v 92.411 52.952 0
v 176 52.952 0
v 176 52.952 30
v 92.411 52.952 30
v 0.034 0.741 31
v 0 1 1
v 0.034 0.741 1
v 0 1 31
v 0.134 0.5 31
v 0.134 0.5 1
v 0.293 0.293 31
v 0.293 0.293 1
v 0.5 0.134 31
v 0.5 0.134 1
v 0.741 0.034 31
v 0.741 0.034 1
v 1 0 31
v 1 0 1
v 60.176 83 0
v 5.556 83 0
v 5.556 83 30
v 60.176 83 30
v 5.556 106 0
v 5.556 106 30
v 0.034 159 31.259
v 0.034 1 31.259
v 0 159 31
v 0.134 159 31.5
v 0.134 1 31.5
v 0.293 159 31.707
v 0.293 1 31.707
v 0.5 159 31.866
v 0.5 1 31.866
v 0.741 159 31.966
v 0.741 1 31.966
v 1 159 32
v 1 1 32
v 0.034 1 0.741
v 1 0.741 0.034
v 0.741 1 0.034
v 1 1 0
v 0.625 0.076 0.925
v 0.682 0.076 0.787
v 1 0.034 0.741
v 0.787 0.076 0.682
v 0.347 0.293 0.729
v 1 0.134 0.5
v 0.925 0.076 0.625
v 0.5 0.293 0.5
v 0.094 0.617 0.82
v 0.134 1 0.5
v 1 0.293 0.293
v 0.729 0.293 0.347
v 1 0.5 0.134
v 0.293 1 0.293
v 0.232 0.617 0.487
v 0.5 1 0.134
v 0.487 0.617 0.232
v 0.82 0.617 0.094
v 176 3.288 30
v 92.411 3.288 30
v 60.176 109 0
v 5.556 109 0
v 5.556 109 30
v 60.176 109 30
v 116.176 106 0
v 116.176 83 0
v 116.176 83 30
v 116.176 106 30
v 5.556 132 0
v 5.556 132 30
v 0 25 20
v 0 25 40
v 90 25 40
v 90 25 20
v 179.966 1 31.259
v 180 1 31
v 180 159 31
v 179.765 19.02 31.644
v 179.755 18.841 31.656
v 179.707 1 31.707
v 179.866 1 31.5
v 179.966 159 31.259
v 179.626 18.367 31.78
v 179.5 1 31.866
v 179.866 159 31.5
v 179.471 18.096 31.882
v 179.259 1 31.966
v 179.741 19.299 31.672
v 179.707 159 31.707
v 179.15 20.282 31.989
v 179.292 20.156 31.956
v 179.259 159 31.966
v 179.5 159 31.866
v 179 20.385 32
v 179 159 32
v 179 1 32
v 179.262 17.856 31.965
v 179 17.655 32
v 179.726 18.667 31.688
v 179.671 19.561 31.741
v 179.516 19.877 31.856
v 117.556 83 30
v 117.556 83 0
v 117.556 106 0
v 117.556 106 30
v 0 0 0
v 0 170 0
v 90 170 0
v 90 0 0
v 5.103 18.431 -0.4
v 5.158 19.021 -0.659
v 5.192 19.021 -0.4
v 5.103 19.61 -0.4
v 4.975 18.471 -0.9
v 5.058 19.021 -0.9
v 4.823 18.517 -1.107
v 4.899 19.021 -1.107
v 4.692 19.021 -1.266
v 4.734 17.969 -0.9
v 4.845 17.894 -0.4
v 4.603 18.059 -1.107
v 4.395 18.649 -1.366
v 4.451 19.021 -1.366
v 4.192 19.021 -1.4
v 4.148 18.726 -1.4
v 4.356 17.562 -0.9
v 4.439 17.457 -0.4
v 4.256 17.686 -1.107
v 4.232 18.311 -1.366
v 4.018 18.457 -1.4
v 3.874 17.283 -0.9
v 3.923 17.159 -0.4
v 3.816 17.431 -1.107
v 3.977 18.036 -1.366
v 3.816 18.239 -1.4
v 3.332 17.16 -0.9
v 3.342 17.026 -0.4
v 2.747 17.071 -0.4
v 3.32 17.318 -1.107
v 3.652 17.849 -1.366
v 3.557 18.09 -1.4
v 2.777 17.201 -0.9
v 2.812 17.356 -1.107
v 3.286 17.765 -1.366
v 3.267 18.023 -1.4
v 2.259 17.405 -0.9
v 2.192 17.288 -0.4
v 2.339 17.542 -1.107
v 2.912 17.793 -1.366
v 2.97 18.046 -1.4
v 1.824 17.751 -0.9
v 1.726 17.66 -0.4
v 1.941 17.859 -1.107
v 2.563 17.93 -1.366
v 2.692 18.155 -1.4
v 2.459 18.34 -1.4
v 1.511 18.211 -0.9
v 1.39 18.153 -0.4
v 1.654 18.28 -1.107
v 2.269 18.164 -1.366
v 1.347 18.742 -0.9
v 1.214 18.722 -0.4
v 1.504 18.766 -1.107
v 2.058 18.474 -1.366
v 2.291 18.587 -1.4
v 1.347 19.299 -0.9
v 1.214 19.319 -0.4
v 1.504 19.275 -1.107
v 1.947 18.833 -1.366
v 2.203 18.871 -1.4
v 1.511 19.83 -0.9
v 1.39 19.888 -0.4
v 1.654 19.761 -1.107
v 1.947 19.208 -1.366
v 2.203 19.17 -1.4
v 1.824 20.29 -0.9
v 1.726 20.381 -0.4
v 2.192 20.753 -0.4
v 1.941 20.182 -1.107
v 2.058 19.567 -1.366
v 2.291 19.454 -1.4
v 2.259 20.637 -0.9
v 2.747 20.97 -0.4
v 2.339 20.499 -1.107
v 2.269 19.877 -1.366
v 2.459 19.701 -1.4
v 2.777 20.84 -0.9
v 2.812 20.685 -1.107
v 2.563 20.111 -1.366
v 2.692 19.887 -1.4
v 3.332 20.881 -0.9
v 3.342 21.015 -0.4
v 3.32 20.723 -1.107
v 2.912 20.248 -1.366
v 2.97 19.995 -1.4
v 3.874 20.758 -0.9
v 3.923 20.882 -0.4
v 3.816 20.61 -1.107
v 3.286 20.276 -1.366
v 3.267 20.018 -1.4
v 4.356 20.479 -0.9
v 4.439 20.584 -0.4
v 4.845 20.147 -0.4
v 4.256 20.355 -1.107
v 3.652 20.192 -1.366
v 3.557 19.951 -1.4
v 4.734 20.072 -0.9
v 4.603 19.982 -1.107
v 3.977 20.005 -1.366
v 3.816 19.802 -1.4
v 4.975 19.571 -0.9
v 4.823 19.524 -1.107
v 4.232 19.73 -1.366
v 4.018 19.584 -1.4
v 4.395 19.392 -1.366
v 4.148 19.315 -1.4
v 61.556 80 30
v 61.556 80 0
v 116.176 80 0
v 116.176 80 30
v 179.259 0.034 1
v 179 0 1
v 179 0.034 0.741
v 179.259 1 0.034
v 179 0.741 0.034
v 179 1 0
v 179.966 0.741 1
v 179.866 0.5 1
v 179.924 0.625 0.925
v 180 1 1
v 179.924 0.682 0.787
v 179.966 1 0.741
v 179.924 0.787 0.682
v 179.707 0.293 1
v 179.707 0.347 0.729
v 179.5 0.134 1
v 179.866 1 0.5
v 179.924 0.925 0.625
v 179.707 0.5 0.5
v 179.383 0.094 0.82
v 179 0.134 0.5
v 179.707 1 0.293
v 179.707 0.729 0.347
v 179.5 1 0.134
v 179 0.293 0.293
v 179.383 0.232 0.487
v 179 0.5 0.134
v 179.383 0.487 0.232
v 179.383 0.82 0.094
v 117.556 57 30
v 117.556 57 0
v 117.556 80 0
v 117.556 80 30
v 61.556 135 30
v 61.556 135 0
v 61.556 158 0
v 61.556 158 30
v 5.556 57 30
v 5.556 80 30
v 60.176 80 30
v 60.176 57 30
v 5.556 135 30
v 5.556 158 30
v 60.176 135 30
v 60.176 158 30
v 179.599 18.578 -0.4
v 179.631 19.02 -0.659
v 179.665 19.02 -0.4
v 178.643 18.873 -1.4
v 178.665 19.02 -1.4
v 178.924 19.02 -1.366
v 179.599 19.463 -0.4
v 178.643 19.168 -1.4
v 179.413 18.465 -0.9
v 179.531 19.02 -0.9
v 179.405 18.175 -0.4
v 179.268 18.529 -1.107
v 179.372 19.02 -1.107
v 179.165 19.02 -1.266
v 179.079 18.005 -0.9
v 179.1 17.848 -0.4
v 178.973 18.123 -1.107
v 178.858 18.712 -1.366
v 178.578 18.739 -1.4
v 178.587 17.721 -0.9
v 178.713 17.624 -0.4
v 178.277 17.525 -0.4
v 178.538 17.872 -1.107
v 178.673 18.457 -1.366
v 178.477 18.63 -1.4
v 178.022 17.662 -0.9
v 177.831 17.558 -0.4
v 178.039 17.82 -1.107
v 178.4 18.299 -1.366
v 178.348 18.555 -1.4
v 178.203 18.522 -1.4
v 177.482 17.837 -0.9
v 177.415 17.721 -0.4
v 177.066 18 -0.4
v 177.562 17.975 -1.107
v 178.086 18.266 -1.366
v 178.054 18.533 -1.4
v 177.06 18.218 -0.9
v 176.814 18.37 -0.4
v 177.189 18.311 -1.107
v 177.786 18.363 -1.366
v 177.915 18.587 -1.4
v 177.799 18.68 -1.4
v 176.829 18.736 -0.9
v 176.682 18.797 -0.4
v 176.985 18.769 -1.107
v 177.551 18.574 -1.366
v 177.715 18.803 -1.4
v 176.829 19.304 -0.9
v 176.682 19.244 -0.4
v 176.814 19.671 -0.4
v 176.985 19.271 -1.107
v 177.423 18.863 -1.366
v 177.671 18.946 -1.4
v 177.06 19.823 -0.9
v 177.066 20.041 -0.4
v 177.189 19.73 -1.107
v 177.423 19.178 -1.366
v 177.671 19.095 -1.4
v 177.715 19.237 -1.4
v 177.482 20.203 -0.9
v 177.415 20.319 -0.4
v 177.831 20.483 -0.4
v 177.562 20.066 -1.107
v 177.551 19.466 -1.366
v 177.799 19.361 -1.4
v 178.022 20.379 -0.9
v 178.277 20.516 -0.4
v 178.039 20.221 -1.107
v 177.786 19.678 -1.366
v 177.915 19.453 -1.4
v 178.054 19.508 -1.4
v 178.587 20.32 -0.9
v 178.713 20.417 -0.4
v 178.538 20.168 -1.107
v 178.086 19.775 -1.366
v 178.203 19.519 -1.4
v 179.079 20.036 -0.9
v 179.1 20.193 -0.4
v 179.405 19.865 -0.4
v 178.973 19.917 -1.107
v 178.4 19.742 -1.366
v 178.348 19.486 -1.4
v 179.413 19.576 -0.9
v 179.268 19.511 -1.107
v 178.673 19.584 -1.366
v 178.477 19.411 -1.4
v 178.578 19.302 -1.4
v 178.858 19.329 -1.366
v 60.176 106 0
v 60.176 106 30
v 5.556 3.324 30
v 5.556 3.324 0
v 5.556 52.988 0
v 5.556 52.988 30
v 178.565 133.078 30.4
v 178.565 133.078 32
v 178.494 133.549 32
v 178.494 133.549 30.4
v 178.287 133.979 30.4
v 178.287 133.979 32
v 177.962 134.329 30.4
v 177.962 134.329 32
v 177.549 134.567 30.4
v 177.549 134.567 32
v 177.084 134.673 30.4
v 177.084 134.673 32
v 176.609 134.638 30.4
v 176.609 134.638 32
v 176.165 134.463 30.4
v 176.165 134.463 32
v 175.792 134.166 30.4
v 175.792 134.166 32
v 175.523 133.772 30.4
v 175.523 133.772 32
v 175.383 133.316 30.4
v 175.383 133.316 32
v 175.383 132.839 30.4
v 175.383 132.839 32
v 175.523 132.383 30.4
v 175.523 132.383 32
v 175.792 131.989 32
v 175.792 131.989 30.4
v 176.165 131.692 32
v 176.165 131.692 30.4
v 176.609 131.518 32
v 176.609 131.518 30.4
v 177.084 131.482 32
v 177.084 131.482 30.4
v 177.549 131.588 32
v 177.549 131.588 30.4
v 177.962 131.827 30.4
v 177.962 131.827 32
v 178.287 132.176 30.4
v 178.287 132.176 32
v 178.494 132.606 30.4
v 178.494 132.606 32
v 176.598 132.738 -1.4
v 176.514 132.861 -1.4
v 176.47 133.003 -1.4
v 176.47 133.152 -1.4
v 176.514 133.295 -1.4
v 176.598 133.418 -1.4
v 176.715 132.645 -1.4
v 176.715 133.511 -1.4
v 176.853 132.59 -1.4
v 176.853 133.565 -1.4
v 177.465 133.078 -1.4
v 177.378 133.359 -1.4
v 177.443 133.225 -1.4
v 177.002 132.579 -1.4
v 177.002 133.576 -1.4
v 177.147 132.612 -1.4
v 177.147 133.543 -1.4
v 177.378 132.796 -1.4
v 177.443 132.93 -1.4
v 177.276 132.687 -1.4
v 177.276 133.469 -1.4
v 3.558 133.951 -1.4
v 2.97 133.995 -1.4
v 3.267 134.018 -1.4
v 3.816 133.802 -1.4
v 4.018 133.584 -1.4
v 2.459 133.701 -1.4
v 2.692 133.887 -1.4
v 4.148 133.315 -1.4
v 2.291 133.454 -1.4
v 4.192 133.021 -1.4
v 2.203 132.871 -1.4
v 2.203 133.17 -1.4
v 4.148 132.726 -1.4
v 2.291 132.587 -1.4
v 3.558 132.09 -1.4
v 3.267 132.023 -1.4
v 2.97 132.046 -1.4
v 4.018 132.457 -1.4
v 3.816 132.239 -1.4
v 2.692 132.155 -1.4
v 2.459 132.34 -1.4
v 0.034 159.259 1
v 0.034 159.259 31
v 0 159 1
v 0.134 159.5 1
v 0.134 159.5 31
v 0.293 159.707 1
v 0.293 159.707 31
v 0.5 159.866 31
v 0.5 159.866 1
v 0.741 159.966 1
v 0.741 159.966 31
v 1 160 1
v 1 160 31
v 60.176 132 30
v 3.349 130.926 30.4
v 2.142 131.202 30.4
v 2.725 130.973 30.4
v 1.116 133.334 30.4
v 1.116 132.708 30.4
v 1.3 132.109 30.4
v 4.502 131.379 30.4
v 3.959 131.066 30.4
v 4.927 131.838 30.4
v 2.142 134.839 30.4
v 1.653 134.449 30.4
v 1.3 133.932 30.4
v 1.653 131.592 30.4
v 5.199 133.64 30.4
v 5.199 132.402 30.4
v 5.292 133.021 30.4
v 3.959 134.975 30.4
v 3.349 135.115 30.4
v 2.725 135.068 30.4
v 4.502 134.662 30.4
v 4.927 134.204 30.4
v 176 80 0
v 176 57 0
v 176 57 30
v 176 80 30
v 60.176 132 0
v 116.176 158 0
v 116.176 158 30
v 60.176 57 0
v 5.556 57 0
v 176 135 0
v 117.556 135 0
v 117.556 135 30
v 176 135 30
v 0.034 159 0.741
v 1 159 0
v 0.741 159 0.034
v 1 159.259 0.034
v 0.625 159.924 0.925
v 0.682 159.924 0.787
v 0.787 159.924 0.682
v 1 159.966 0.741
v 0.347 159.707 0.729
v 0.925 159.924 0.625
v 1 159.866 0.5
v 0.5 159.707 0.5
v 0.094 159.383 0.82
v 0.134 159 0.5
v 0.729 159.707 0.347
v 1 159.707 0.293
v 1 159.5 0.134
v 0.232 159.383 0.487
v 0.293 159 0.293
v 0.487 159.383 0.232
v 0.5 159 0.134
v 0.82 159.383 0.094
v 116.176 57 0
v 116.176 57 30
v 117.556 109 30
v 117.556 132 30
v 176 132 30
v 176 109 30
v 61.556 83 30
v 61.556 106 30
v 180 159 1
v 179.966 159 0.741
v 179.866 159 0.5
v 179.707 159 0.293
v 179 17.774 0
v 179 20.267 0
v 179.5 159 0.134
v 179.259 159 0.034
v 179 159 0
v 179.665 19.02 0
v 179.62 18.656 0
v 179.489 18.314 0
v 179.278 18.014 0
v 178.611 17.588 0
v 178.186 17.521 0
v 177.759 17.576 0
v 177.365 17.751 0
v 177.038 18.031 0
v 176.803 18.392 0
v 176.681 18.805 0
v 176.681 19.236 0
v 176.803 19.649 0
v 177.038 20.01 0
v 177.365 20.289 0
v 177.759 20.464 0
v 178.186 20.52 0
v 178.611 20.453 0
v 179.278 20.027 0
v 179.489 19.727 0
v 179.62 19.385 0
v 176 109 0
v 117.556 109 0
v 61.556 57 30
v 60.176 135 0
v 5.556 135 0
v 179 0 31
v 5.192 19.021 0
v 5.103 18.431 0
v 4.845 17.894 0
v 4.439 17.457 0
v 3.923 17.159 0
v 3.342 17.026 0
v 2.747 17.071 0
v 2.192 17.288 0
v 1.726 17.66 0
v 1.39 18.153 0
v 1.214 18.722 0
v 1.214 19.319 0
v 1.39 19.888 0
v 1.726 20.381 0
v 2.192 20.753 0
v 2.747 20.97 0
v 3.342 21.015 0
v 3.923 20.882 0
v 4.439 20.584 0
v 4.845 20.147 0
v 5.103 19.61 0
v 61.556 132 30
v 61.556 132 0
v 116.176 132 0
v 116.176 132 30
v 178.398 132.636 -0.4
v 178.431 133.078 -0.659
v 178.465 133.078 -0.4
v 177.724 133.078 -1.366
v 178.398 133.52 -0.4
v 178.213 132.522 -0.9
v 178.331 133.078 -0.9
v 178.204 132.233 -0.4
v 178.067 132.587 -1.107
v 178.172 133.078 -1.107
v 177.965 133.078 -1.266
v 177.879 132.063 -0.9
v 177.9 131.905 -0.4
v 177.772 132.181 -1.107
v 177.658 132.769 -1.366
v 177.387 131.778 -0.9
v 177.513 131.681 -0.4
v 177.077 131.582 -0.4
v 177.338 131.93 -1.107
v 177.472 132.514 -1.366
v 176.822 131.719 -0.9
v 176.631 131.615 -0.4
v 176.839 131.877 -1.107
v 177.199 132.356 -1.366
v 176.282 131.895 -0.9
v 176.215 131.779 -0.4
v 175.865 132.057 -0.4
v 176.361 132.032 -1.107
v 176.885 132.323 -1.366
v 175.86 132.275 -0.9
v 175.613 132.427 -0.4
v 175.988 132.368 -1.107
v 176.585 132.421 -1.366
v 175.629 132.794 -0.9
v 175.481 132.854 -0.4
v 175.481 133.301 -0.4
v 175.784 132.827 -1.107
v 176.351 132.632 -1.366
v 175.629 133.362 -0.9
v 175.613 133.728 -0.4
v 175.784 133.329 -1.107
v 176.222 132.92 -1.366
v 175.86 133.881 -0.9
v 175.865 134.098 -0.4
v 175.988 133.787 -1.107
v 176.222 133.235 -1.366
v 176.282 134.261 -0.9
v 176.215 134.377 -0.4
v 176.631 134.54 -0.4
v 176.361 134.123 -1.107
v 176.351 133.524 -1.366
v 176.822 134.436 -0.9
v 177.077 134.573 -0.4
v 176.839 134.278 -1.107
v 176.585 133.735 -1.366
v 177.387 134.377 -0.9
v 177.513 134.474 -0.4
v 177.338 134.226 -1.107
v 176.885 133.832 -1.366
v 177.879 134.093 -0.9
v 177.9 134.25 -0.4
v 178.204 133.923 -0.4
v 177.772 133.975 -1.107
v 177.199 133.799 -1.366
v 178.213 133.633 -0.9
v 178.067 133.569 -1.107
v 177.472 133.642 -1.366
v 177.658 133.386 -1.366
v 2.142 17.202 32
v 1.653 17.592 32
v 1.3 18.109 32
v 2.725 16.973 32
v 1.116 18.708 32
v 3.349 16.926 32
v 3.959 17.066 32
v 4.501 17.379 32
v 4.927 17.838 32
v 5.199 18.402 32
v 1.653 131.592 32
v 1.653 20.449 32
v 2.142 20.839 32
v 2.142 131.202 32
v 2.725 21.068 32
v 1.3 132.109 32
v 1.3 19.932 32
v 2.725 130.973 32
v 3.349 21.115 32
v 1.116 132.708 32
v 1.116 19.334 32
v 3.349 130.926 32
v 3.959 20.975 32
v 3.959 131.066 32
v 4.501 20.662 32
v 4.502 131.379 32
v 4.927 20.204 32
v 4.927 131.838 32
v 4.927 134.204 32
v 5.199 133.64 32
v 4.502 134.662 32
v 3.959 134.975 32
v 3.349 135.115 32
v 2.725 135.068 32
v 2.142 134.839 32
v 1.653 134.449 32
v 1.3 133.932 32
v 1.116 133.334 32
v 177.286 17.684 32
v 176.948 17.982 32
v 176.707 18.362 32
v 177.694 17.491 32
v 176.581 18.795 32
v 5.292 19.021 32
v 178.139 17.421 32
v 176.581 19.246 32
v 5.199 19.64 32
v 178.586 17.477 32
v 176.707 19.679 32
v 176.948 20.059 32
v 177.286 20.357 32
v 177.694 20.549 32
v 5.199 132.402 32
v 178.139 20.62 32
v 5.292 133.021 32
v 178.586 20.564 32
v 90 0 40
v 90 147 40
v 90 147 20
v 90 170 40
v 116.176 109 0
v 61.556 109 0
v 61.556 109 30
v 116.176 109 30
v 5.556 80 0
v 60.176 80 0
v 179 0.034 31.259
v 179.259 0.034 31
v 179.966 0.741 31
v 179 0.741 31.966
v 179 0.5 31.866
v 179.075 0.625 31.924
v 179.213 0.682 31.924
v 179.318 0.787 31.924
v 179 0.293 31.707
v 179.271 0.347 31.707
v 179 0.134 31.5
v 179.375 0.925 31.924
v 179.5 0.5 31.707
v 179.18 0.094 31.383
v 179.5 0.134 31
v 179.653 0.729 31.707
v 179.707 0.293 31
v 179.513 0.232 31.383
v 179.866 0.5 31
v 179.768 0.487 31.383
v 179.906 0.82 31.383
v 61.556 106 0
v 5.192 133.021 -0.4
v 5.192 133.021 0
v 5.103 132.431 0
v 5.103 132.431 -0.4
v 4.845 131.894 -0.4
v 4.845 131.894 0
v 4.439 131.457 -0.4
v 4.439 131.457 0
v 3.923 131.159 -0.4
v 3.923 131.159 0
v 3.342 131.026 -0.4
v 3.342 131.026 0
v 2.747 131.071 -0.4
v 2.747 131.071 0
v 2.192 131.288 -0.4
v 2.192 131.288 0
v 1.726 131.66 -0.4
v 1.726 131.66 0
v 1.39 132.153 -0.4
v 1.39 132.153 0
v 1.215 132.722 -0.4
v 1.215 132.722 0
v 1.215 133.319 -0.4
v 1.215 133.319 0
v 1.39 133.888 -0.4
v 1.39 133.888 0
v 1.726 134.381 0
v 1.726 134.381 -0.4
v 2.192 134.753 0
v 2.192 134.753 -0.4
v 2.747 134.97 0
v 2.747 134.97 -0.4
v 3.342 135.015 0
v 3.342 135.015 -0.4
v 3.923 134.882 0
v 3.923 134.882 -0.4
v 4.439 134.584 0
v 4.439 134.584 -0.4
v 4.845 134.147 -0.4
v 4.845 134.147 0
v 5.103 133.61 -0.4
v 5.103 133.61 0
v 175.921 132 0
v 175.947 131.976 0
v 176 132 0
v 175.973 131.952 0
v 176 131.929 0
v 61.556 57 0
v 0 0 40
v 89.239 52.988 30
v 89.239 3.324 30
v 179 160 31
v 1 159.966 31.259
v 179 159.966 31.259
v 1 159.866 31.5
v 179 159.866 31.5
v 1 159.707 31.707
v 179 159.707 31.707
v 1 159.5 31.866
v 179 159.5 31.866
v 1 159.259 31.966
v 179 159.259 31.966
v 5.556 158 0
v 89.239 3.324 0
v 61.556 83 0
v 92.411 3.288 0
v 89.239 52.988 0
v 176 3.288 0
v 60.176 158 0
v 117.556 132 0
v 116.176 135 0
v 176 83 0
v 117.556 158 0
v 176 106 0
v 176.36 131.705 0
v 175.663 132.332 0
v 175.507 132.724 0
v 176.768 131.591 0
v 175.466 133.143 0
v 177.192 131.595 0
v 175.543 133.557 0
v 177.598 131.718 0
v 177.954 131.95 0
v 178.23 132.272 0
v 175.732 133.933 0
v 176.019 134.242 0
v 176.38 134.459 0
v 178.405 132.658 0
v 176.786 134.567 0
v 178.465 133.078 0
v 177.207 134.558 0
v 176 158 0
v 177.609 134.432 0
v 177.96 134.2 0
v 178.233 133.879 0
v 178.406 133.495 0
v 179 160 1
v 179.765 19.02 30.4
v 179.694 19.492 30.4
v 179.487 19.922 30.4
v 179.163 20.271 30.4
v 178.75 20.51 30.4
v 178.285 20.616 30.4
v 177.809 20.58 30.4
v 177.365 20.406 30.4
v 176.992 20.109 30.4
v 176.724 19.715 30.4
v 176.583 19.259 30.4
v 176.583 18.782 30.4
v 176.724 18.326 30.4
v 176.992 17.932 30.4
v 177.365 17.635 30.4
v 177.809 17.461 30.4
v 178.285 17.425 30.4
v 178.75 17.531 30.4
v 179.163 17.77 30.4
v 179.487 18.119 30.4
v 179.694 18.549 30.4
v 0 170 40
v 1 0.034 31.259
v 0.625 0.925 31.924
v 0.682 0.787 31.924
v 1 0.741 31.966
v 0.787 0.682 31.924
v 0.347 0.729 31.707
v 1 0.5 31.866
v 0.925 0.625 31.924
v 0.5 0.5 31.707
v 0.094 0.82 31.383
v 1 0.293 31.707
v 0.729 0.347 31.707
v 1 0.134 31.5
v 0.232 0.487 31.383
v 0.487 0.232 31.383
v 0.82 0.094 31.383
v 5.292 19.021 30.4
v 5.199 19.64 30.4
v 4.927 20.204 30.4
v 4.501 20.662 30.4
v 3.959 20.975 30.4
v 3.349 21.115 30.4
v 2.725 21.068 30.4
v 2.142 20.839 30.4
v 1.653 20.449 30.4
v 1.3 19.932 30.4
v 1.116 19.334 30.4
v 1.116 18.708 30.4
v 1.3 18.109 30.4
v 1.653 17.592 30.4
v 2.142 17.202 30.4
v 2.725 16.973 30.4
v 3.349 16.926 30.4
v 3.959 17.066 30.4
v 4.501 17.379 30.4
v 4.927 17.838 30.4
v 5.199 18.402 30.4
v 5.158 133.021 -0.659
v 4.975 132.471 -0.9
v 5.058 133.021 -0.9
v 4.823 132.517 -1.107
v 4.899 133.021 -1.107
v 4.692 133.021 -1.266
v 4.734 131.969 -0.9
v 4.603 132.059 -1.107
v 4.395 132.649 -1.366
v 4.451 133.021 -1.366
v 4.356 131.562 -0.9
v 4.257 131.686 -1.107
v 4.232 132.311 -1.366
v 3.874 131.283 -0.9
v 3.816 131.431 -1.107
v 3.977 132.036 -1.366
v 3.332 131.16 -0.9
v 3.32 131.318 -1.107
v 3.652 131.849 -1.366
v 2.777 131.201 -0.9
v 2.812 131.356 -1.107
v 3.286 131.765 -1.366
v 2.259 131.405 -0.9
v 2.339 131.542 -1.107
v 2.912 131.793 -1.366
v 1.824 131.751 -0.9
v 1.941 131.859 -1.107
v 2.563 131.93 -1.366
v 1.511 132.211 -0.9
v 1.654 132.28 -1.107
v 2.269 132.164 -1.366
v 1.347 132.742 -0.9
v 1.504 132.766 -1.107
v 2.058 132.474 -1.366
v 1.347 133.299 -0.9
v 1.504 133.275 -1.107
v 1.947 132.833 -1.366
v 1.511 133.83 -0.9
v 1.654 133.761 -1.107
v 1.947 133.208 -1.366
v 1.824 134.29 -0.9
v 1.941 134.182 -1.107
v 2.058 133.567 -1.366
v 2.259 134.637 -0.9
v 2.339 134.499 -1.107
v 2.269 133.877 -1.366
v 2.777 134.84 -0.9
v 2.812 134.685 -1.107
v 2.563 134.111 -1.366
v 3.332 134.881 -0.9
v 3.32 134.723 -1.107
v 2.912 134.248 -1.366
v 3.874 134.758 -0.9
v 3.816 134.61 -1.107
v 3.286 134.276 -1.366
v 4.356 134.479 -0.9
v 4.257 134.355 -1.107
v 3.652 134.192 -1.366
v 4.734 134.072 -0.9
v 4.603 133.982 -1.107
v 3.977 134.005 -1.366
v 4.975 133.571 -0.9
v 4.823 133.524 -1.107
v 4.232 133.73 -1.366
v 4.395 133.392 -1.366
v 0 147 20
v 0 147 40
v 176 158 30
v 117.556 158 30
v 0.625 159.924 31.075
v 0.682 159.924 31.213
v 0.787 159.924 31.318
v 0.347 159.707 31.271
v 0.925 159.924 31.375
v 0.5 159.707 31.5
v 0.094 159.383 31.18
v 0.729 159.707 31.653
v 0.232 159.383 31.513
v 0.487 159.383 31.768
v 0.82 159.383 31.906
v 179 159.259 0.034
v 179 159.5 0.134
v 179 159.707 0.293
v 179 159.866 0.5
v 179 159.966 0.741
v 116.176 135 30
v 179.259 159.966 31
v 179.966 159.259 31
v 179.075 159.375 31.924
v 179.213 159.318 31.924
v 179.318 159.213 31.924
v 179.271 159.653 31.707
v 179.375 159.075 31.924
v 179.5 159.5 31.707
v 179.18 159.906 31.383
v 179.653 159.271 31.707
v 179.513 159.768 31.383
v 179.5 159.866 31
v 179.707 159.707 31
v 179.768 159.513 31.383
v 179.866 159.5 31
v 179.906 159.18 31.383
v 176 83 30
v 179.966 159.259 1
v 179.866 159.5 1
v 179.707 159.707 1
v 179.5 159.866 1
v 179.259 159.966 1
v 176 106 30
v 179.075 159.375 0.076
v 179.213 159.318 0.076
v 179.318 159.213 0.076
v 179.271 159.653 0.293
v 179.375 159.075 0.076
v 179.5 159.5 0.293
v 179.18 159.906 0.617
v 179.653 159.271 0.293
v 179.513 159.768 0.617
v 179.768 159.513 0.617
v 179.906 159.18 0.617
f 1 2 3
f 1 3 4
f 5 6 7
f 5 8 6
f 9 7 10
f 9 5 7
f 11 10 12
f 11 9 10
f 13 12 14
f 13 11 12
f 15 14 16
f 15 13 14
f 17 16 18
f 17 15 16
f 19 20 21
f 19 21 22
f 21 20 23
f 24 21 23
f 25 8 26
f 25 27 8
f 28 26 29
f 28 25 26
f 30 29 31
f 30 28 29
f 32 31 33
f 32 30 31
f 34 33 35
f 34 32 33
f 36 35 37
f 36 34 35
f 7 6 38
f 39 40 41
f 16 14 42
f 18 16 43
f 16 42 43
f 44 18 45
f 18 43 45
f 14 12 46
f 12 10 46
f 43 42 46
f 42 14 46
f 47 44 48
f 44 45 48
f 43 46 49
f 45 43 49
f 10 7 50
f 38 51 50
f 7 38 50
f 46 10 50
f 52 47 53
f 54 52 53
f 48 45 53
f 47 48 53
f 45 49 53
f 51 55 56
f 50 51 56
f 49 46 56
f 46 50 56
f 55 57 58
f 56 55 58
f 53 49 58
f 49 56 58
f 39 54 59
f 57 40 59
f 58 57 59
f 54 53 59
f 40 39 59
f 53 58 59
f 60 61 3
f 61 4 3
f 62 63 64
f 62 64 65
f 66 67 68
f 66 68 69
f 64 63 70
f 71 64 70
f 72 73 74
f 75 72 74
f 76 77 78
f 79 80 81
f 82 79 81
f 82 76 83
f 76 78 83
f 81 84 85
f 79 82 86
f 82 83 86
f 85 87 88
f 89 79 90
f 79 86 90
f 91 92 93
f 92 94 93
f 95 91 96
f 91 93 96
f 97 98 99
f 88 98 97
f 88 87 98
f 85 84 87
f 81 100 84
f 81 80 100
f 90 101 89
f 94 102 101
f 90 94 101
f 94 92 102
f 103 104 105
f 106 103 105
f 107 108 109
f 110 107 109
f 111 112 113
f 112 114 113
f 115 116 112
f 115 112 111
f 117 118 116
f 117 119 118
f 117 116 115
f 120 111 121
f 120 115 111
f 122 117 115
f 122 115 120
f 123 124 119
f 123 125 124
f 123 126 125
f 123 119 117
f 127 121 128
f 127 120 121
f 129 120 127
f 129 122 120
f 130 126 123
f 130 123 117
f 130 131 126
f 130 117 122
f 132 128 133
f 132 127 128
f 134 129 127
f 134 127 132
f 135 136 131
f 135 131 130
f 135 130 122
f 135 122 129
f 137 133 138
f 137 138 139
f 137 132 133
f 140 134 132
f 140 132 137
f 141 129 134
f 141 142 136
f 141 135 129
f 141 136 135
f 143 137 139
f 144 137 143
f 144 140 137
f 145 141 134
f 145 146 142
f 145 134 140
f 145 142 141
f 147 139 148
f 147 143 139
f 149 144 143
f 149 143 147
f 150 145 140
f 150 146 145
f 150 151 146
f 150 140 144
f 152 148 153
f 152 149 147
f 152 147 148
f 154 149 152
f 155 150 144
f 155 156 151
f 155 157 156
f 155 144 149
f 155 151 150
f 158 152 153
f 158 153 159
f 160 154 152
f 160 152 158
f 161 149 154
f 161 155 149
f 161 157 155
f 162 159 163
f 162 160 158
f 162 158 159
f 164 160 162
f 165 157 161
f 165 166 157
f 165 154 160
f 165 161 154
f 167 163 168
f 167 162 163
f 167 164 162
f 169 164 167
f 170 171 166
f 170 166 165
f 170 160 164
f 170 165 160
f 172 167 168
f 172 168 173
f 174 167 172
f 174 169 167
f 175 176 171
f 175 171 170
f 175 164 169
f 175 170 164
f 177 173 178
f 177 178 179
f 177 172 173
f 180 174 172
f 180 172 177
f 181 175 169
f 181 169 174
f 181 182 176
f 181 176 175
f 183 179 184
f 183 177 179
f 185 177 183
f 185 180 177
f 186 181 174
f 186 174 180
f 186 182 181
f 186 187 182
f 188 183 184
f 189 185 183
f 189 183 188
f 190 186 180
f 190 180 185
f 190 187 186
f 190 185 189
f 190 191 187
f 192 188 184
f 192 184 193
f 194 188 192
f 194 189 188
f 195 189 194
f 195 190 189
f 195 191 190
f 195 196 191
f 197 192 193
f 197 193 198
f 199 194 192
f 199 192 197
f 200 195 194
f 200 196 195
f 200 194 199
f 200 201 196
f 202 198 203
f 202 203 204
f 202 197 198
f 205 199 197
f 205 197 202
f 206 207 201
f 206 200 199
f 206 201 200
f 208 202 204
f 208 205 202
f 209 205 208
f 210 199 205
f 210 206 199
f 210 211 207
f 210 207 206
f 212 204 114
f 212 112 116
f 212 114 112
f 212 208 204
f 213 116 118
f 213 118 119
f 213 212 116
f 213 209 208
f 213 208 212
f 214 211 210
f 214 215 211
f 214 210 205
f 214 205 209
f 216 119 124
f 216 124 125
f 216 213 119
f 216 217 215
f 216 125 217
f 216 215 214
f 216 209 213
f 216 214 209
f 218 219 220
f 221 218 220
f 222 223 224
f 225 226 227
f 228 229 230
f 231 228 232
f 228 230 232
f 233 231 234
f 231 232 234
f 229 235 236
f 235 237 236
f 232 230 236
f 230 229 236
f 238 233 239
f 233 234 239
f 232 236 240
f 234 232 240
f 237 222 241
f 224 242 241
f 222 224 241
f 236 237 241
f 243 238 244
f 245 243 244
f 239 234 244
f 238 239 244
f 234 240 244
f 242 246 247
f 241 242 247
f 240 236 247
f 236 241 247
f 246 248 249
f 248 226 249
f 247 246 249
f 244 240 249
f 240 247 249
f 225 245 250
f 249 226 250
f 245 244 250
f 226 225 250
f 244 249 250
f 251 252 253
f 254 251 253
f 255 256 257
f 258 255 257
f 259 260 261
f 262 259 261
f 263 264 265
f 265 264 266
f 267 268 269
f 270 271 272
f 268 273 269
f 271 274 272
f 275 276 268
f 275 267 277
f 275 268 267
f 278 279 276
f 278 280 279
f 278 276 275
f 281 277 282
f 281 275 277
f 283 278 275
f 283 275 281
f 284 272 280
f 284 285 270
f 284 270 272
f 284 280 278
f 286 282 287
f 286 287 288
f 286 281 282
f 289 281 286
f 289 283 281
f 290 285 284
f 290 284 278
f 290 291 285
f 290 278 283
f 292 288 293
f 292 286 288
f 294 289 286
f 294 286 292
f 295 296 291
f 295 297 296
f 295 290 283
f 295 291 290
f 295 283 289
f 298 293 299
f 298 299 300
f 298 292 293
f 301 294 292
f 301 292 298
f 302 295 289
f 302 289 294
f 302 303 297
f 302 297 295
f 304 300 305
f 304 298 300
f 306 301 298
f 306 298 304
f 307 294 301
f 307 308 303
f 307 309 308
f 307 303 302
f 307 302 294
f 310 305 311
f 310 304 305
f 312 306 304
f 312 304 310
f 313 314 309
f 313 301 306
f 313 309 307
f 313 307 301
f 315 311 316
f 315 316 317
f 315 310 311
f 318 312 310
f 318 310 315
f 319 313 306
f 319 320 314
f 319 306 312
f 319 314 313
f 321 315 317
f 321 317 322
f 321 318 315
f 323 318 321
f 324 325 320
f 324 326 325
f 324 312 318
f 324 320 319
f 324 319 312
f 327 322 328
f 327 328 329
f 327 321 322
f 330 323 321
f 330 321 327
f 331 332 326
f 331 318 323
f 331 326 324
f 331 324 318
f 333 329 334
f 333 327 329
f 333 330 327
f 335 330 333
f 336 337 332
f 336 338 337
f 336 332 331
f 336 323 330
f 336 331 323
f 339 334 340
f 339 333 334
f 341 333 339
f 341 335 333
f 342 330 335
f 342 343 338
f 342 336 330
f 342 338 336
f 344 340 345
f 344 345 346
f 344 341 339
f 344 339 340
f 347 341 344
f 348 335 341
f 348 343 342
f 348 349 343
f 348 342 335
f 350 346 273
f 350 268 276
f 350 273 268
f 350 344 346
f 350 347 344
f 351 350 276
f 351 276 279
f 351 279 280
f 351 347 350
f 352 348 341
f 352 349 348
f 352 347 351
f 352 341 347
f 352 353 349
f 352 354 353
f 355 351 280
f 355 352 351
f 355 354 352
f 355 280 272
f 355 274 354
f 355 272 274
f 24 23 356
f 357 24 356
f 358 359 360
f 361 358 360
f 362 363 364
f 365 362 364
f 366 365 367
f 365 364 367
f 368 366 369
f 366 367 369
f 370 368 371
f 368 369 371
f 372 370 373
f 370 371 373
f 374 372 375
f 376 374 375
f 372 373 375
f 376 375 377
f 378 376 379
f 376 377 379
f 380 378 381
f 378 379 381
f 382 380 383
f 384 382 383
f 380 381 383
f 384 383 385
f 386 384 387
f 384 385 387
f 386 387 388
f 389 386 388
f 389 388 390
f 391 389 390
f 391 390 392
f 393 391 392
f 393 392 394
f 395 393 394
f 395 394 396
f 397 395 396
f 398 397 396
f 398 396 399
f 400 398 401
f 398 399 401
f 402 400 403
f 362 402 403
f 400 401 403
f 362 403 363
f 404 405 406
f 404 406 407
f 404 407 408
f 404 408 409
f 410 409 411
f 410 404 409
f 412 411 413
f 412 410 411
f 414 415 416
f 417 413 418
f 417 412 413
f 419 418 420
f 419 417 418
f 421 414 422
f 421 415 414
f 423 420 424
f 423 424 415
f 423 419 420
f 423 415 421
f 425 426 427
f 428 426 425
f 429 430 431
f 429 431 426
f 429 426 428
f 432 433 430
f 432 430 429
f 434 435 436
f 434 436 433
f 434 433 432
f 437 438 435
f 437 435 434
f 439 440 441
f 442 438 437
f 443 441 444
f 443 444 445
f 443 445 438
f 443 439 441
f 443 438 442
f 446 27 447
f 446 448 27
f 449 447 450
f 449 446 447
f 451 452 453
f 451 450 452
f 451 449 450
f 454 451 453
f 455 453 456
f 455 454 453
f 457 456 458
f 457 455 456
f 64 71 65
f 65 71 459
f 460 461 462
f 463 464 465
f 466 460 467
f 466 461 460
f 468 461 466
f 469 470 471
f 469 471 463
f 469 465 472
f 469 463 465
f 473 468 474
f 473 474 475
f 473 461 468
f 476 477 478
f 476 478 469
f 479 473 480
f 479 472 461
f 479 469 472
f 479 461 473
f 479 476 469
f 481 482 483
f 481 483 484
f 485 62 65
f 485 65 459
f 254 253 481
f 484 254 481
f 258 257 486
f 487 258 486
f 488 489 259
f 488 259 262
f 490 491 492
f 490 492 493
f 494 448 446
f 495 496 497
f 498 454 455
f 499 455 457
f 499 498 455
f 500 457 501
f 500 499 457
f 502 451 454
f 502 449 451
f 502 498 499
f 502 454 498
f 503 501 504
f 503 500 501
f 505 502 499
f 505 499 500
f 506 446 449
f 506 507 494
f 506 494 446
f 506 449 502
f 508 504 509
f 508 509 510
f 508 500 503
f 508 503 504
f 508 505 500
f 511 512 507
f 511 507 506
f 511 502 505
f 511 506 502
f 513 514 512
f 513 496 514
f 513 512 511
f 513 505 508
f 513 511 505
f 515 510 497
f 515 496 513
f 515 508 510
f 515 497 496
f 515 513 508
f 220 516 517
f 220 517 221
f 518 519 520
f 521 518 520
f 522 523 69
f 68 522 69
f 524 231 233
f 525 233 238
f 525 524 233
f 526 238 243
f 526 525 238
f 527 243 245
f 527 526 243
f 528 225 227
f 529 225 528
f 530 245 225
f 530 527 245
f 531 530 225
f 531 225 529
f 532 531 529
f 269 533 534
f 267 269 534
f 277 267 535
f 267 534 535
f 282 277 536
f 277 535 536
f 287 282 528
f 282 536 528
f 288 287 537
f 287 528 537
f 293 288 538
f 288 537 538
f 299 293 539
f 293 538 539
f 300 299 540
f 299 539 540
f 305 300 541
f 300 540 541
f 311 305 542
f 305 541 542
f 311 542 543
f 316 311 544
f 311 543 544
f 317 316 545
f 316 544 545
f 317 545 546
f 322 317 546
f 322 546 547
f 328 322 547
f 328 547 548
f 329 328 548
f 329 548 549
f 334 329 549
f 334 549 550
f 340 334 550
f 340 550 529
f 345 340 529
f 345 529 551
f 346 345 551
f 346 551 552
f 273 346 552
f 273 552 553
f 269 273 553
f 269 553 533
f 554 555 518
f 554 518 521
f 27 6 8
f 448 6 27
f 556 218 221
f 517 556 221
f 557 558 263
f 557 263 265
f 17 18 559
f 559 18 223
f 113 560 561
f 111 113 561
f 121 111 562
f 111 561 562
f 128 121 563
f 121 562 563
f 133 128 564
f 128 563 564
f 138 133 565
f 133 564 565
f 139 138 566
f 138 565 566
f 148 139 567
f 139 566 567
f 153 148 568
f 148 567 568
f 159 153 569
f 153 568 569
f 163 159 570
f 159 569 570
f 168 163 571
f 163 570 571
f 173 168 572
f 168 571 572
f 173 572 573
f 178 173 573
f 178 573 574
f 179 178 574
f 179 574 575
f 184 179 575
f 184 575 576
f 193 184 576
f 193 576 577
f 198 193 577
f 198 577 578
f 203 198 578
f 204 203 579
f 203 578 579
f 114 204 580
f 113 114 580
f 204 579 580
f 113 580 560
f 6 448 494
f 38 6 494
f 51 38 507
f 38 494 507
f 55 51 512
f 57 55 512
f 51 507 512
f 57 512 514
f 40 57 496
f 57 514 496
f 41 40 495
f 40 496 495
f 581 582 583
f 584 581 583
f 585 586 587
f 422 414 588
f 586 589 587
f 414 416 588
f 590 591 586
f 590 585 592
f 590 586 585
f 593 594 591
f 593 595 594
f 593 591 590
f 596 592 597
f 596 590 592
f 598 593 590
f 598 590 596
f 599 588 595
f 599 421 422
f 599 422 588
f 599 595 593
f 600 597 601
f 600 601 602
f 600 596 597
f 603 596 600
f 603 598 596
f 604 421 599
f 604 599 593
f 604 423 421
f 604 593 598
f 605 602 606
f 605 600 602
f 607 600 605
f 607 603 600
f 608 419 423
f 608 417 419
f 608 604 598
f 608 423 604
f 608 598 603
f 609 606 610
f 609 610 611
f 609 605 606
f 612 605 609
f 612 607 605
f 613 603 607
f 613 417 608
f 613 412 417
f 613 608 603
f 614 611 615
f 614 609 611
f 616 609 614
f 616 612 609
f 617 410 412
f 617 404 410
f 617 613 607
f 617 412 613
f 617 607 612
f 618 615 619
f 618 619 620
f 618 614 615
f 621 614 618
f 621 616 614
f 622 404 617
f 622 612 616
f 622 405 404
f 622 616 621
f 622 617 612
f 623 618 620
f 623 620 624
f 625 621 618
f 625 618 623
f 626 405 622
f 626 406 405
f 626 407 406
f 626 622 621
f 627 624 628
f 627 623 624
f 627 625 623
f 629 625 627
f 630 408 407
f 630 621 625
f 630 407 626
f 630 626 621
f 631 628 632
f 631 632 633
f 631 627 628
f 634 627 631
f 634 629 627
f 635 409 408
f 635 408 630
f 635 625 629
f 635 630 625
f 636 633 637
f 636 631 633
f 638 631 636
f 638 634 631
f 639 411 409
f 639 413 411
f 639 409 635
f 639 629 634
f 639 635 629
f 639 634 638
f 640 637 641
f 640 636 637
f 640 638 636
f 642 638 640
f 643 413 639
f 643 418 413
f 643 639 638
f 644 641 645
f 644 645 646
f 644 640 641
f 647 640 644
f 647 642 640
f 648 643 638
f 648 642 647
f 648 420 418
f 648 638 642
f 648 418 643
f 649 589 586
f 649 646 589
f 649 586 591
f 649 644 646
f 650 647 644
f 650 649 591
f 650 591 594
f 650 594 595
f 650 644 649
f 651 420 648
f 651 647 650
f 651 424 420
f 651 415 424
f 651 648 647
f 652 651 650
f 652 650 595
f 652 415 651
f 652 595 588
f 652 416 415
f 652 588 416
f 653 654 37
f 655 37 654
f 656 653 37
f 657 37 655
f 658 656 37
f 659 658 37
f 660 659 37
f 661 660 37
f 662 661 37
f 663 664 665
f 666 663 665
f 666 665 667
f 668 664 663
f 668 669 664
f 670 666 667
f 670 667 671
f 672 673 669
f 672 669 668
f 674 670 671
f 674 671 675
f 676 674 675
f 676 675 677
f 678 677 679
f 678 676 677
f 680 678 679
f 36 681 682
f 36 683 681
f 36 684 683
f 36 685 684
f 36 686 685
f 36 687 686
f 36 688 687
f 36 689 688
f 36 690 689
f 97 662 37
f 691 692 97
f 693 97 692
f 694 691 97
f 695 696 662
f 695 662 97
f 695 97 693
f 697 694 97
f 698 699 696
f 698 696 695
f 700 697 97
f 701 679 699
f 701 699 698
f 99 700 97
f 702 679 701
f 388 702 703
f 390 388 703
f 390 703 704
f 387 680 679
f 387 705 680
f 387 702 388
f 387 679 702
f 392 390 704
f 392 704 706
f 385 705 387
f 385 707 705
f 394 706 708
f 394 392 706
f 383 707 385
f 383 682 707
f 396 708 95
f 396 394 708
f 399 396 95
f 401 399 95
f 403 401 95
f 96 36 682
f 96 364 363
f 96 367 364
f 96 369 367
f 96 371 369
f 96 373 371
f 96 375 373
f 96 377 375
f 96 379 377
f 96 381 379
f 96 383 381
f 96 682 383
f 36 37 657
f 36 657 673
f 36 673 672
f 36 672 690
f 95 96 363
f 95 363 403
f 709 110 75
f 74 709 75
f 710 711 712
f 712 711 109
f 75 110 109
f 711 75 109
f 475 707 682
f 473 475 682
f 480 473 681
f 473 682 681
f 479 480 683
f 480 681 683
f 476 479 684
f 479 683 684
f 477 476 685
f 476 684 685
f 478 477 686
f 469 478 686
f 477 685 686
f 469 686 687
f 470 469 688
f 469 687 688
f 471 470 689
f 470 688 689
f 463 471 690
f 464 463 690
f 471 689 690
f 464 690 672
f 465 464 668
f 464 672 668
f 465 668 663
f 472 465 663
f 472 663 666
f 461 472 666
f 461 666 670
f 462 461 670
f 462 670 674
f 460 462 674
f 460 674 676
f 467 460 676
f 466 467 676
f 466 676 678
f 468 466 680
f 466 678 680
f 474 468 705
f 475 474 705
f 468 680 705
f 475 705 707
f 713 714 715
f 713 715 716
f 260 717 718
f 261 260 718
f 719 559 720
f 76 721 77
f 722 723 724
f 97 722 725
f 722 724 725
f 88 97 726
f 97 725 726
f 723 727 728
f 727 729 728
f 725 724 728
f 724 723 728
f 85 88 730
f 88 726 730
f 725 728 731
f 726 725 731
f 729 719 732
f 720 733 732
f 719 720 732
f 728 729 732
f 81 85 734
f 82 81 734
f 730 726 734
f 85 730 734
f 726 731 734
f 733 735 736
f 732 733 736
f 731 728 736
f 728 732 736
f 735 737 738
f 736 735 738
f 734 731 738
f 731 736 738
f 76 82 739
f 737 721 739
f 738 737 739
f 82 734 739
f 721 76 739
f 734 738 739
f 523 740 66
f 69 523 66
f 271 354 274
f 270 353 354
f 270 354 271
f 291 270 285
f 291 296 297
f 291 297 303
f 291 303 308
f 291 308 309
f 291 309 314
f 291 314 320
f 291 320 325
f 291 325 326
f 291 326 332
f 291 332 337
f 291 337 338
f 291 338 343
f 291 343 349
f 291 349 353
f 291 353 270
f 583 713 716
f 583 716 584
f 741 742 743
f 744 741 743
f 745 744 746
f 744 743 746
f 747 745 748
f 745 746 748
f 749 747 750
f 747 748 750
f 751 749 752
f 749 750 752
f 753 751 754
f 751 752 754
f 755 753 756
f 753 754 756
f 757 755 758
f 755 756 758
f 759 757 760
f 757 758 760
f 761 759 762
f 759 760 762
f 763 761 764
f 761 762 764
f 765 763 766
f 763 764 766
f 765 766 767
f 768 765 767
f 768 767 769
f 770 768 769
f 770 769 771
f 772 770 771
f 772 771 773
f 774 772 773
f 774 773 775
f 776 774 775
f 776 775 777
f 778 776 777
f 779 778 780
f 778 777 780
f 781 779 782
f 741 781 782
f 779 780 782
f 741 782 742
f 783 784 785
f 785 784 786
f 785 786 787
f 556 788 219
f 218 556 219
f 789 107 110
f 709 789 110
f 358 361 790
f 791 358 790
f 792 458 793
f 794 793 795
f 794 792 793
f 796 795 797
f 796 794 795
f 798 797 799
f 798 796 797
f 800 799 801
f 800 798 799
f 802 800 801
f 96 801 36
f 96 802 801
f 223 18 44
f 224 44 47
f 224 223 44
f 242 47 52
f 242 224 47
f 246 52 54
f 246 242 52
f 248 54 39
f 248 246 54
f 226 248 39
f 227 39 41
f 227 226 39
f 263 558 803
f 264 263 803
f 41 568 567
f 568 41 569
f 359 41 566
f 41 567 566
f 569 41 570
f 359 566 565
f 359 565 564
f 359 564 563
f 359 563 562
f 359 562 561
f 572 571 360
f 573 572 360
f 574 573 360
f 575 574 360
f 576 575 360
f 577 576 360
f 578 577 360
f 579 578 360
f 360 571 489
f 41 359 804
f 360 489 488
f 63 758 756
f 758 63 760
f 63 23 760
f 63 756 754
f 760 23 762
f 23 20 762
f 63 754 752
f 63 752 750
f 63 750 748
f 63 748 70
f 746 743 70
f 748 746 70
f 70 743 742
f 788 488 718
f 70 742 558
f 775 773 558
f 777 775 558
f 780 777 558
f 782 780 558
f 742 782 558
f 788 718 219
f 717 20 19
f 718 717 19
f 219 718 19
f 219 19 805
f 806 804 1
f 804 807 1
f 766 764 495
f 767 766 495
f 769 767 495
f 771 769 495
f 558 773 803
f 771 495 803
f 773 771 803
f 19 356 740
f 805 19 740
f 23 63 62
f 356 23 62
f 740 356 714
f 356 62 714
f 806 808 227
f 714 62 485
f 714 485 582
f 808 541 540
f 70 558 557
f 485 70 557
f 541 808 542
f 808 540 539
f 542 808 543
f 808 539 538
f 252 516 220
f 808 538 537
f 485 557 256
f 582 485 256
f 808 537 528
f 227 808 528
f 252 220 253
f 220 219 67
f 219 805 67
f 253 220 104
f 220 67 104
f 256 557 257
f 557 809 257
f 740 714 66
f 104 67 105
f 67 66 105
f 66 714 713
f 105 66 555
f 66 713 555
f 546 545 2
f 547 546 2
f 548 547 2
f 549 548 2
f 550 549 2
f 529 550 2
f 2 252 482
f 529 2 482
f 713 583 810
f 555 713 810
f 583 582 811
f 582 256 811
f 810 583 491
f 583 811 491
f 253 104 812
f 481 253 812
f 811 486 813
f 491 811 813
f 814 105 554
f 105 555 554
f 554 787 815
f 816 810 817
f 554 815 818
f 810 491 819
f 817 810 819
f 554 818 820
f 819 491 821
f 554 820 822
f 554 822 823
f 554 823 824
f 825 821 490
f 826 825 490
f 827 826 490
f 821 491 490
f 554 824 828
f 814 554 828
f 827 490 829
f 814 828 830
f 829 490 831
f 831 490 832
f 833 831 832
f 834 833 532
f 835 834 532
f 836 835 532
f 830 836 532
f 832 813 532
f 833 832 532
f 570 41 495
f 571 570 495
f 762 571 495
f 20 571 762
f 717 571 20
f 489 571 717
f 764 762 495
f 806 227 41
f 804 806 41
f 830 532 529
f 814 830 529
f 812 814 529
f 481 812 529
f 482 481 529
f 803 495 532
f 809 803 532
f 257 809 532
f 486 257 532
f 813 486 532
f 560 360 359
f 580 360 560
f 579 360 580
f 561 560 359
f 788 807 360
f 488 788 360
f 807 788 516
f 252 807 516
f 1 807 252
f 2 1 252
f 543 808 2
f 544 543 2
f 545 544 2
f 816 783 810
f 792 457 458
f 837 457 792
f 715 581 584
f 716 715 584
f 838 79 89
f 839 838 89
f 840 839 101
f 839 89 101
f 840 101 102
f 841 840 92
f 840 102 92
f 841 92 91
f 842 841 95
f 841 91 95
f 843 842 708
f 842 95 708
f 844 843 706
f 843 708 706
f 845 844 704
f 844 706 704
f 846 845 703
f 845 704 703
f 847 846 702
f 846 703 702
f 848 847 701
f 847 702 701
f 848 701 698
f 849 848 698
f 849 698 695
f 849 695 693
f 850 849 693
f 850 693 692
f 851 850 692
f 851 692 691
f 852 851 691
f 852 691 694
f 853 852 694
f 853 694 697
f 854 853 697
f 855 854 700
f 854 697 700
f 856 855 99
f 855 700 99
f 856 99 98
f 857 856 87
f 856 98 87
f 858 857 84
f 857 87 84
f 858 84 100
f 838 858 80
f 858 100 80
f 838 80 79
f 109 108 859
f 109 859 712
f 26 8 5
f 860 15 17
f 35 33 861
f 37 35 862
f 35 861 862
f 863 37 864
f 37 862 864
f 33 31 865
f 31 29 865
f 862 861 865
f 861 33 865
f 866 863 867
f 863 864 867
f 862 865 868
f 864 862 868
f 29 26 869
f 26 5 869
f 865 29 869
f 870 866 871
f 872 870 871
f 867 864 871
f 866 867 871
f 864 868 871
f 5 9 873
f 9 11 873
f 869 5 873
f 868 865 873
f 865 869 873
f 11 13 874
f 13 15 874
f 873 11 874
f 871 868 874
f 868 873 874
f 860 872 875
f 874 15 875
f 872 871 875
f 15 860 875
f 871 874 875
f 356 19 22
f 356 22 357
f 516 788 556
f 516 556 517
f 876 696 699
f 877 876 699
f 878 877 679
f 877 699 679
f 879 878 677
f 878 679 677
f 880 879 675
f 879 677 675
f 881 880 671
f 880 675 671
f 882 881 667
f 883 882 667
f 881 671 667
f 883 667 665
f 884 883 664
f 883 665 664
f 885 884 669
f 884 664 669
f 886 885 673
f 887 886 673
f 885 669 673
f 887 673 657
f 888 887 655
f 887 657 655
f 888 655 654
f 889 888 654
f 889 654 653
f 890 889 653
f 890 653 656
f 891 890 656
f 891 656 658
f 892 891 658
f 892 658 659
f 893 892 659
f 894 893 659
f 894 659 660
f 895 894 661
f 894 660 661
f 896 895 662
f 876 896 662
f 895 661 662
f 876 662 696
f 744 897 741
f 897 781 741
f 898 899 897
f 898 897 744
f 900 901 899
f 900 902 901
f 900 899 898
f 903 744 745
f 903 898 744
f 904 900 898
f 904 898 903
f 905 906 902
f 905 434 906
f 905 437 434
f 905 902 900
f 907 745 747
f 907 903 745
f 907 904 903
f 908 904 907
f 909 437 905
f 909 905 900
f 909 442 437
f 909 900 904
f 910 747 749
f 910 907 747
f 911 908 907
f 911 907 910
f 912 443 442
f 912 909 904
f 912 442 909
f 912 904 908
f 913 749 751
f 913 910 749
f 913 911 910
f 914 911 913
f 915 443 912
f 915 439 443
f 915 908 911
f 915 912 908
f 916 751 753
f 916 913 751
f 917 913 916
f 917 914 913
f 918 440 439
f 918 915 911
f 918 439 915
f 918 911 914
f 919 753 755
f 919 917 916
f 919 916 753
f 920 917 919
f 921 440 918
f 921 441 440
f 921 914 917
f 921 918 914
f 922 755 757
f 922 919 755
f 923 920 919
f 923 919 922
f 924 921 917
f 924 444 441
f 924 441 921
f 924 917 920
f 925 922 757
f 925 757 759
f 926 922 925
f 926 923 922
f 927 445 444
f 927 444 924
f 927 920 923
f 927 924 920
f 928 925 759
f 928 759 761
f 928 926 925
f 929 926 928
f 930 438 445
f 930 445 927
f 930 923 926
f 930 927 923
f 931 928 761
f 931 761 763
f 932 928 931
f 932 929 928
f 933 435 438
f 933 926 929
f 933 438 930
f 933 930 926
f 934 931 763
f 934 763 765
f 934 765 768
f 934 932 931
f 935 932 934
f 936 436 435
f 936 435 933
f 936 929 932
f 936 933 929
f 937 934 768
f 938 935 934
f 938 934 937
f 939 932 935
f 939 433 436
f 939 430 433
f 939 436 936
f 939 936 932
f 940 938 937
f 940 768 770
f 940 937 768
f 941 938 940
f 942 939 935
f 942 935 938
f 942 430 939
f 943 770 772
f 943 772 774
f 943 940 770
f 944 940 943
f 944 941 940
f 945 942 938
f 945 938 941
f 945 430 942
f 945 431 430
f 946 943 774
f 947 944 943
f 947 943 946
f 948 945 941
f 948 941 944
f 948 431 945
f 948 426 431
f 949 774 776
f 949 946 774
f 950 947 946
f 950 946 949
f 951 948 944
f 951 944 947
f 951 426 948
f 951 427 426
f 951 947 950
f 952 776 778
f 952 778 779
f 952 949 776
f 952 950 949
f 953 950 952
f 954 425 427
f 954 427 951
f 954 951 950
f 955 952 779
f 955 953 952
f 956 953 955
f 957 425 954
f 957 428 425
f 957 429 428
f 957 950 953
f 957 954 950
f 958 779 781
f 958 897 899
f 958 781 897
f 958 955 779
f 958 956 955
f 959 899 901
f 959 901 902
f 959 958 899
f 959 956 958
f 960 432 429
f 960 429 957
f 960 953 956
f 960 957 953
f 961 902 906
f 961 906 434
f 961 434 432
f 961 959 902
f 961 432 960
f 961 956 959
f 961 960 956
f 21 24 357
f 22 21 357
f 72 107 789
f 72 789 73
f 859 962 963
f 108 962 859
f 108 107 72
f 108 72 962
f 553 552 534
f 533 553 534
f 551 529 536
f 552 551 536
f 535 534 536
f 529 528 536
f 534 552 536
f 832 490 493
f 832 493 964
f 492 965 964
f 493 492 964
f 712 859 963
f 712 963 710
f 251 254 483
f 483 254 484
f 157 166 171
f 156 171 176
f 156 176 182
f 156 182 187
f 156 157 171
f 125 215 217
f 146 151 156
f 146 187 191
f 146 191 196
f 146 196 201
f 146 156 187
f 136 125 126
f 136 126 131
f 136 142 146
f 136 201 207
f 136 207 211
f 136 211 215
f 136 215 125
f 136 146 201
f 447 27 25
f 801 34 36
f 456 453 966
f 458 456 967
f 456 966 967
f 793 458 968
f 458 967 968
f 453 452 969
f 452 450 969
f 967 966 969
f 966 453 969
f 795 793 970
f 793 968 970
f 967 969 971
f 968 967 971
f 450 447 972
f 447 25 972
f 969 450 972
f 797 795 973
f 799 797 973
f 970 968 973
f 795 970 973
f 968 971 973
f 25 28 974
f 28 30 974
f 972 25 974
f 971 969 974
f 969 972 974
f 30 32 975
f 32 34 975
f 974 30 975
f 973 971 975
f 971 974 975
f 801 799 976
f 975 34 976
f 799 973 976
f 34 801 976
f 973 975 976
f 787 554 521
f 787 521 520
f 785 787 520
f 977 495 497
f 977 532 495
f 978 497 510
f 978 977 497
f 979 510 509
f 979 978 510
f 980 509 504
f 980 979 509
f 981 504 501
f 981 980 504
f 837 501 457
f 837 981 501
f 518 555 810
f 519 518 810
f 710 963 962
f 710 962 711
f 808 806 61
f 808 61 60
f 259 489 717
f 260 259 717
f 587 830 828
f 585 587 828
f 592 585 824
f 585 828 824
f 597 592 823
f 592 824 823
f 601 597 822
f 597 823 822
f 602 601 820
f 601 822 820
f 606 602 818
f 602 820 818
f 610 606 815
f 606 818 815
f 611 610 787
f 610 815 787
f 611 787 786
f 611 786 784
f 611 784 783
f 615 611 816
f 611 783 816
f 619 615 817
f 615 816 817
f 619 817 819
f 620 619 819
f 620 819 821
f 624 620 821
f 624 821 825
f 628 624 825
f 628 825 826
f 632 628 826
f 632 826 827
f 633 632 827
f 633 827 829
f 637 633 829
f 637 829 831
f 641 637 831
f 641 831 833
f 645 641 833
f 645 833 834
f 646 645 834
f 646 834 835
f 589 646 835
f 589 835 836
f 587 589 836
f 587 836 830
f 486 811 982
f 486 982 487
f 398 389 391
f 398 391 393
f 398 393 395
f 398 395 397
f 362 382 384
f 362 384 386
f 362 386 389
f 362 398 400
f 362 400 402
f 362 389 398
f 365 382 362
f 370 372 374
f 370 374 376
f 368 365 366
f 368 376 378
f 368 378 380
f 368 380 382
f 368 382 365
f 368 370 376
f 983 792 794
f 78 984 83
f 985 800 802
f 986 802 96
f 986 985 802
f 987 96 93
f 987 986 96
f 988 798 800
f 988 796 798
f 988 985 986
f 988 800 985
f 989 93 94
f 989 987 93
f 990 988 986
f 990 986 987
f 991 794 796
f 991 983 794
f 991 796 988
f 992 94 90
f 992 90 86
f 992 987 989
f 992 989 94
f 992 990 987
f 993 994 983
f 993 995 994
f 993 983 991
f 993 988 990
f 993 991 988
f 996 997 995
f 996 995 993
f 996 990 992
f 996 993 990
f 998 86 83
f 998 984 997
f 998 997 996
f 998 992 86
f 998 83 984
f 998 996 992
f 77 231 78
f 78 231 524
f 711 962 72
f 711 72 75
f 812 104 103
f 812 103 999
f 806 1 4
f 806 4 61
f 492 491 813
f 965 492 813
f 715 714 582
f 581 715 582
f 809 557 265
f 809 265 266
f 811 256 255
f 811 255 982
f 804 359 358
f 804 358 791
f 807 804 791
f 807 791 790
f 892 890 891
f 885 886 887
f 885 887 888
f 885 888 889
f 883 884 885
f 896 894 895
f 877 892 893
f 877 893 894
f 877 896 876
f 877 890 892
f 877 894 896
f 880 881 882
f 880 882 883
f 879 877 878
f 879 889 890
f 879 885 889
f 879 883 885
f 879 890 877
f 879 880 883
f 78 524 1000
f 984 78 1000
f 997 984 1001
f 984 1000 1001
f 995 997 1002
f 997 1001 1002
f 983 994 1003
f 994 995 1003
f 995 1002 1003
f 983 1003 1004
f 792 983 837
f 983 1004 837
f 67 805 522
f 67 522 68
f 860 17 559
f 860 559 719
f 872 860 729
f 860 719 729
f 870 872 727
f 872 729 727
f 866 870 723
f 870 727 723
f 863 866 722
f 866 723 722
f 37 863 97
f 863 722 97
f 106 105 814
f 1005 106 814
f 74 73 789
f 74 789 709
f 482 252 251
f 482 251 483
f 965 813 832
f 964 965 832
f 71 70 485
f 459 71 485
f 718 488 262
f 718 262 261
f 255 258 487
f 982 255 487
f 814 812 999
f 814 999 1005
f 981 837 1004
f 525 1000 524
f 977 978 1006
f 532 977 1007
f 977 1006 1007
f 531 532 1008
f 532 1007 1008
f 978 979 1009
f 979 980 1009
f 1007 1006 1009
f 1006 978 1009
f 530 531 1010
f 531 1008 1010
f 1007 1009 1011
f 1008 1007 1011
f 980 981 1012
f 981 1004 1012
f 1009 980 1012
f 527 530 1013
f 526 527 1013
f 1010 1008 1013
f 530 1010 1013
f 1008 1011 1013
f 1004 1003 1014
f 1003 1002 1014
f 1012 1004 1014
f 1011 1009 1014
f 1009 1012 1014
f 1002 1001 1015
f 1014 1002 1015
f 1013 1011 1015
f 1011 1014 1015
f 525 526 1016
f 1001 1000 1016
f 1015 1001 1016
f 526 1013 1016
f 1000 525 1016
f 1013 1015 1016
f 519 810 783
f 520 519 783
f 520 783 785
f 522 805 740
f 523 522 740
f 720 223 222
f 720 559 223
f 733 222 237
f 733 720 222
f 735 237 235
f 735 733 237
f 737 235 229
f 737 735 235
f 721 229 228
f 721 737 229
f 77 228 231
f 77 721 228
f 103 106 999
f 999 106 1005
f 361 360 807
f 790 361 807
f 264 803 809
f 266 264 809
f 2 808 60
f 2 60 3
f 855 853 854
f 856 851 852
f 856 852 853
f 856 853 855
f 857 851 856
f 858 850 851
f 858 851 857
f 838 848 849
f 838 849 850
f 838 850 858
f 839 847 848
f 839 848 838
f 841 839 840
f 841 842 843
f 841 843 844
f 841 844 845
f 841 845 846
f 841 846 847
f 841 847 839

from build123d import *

# Parameters (mm, degrees)
SKETCH_W        = 180
SKETCH_H        = 160
SKETCH_W_2      = 83.683545
SKETCH_H_2      = 49.663596
SKETCH_W_3      = 54.620335
SKETCH_H_3      = 23
SKETCH_W_4      = 58.444272
PAD001_DEPTH    = 30
SKETCH004_W     = 180
SKETCH004_H     = 160
PAD002_DEPTH    = 2
FILLET_R        = 1
SKETCH005_R     = 2
SKETCH005_R_2   = 1.5
PAD003_DEPTH    = 1.4
FILLET001_R     = 1
SKETCH006_R     = 2.1
SKETCH006_R_2   = 1.6
POCKET001_DEPTH = 1.6
SKETCH002_W     = 90
SKETCH002_H     = 170
PAD_DEPTH       = 40
SKETCH003_W     = 90
SKETCH003_H     = 122
POCKET_DEPTH    = 20


with BuildPart() as body:
    # Sketch (on XY_Plane of Origin) → Pad001 (new body)
    with BuildSketch(Plane.XY):
        with Locations((90, 80)):
            Rectangle(SKETCH_W, SKETCH_H)
        with Locations((47.3975, 28.156104)):
            Rectangle(SKETCH_W_2, SKETCH_H_2, mode=Mode.SUBTRACT)
        Polygon((176, 3.288444), (176, 52.95204), (92.411482, 52.95204), (92.411499, 3.288444), align=None, mode=Mode.SUBTRACT)
        with Locations((32.865896, 146.5)):
            Rectangle(SKETCH_W_3, SKETCH_H_3, mode=Mode.SUBTRACT)
        with Locations((88.865895, 146.5)):
            Rectangle(SKETCH_W_3, SKETCH_H_3, mode=Mode.SUBTRACT)
        with Locations((146.777864, 146.5)):
            Rectangle(SKETCH_W_4, SKETCH_H_3, mode=Mode.SUBTRACT)
        with Locations((32.865896, 120.5)):
            Rectangle(SKETCH_W_3, SKETCH_H_3, mode=Mode.SUBTRACT)
        with Locations((88.865895, 120.5)):
            Rectangle(SKETCH_W_3, SKETCH_H_3, mode=Mode.SUBTRACT)
        with Locations((146.777864, 120.5)):
            Rectangle(SKETCH_W_4, SKETCH_H_3, mode=Mode.SUBTRACT)
        with Locations((32.865896, 94.5)):
            Rectangle(SKETCH_W_3, SKETCH_H_3, mode=Mode.SUBTRACT)
        with Locations((88.865895, 94.5)):
            Rectangle(SKETCH_W_3, SKETCH_H_3, mode=Mode.SUBTRACT)
        with Locations((146.777864, 94.5)):
            Rectangle(SKETCH_W_4, SKETCH_H_3, mode=Mode.SUBTRACT)
        with Locations((32.865896, 68.5)):
            Rectangle(SKETCH_W_3, SKETCH_H_3, mode=Mode.SUBTRACT)
        with Locations((88.865895, 68.5)):
            Rectangle(SKETCH_W_3, SKETCH_H_3, mode=Mode.SUBTRACT)
        with Locations((146.777864, 68.5)):
            Rectangle(SKETCH_W_4, SKETCH_H_3, mode=Mode.SUBTRACT)
    extrude(amount=PAD001_DEPTH)

    # Sketch004 (on Face62 of Pad001) → Pad002 (join)
    with BuildSketch(Plane.XY.offset(30)):
        with Locations((90, 80)):
            Rectangle(SKETCH004_W, SKETCH004_H)
    extrude(amount=PAD002_DEPTH)

    # Fillet
    fillet_edges = [body.edges().sort_by_distance(p)[0] for p in [
        (0, 80, 0),
        (0, 0, 16),
        (0, 80, 32),
        (0, 160, 16),
        (90, 0, 0),
        (180, 0, 16),
        (90, 0, 32),
        (180, 160, 16),
        (90, 160, 0),
        (90, 160, 32),
        (180, 80, 0),
        (180, 80, 32),
    ]]
    fillet(fillet_edges, radius=FILLET_R)

    # Sketch005 (on Face1 of Fillet) → Pad003 (join)
    with BuildSketch(Plane(origin=(0, 0, 0), x_dir=(1, 0, 0), z_dir=(0, 0, -1))):
        with Locations((3.192135, -19.020531)):
            Circle(SKETCH005_R)
        with Locations((178.165253, -19.020437)):
            Circle(SKETCH005_R_2)
        with Locations((3.192172, -133.020531)):
            Circle(SKETCH005_R)
        with Locations((176.964737, -133.077667)):
            Circle(SKETCH005_R_2)
    extrude(amount=PAD003_DEPTH)

    # Fillet001
    fillet001_edges = [body.edges().sort_by_distance(p)[0] for p in [
        (1.192135, 19.020531, -1.4),
        (176.665253, 19.020437, -1.4),
        (175.464737, 133.077667, -1.4),
        (1.192172, 133.020531, -1.4),
    ]]
    fillet(fillet001_edges, radius=FILLET001_R)

    # Sketch006 (on Face107 of Fillet001) → Pocket001 (cut)
    with BuildSketch(Plane.XY.offset(32)):
        with Locations((3.192172, 133.020531)):
            Circle(SKETCH006_R)
        with Locations((3.192135, 19.020531)):
            Circle(SKETCH006_R)
        with Locations((178.165253, 19.020437)):
            Circle(SKETCH006_R_2)
        with Locations((176.964737, 133.077667)):
            Circle(SKETCH006_R_2)
    extrude(amount=-POCKET001_DEPTH, mode=Mode.SUBTRACT)


with BuildPart() as sign_tree:
    # Sketch002 (on XY_Plane001 of Origin002) → Pad (new body)
    with BuildSketch(Plane.XY):
        with Locations((45, 85)):
            Rectangle(SKETCH002_W, SKETCH002_H)
    extrude(amount=PAD_DEPTH)

    # Sketch003 (on Face6 of Pad) → Pocket (cut)
    with BuildSketch(Plane.XY.offset(40)):
        with Locations((45, 86)):
            Rectangle(SKETCH003_W, SKETCH003_H)
    extrude(amount=-POCKET_DEPTH, mode=Mode.SUBTRACT)


solid = Compound([body.part, sign_tree.part])
